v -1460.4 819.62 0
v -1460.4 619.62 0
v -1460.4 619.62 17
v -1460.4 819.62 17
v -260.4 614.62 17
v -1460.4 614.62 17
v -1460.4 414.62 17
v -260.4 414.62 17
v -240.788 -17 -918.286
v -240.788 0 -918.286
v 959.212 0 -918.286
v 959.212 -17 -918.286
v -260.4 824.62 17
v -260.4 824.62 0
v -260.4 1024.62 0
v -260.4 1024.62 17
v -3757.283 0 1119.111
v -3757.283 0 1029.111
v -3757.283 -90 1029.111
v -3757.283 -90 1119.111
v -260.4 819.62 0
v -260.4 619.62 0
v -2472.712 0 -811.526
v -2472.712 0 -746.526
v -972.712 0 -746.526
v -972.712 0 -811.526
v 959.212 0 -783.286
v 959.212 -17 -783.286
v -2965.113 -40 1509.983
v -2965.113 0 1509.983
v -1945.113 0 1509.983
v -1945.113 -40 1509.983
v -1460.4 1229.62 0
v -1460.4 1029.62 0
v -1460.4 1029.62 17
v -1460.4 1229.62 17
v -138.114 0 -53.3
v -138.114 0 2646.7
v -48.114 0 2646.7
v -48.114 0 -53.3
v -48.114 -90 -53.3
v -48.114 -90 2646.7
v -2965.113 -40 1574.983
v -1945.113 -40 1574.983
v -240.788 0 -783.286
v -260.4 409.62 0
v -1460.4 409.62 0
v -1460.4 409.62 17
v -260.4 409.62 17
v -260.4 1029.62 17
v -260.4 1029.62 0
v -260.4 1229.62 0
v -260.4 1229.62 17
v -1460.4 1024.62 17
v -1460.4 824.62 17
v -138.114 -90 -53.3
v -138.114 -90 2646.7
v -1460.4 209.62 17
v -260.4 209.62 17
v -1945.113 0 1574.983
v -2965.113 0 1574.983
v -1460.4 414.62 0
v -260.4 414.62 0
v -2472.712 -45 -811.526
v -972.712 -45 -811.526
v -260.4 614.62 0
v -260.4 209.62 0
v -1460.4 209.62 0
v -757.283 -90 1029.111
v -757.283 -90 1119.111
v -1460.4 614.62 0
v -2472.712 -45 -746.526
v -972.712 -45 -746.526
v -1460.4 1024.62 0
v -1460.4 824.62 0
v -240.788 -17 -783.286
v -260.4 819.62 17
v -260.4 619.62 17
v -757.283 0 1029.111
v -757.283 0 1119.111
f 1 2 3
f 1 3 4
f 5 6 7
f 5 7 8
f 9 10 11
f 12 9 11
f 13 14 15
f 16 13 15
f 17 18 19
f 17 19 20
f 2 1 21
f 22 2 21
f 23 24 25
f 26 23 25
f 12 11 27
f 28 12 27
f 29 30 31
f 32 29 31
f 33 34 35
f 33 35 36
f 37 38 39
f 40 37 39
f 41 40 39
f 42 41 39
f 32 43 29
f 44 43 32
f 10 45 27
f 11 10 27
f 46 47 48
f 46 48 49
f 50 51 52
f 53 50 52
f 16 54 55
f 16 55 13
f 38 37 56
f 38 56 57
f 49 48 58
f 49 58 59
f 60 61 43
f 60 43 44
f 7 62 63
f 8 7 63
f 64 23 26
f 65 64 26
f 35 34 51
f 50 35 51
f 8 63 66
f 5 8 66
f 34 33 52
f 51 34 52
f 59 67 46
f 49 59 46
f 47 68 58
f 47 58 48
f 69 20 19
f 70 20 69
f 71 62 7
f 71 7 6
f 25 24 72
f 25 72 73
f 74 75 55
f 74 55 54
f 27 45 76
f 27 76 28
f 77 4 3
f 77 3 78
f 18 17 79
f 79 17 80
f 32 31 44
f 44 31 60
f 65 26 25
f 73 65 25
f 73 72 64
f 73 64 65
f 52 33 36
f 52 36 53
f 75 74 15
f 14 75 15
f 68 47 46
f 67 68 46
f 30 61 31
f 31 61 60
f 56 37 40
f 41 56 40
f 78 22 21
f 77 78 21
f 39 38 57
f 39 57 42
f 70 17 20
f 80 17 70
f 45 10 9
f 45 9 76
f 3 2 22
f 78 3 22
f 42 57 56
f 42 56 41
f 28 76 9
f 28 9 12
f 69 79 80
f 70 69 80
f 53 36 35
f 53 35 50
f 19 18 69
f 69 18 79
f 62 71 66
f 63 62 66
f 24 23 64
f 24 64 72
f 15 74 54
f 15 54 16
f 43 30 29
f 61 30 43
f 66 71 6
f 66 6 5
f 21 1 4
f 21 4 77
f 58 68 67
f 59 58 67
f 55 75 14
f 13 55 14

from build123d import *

# Parameters (mm, degrees)
F0_W      = 90
F0_H      = 2700
F1_DEPTH  = 90
F2_W      = 3000
F2_H      = 90
F3_DEPTH  = 90
F4_W      = 1500
F4_H      = 65
F5_DEPTH  = 45
F6_W      = 1200
F6_H      = 135
F7_DEPTH  = 17
F8_W      = 1020
F8_H      = 65
F9_DEPTH  = 40
F10_W     = 1200
F10_H     = 200
F11_DEPTH = 17


with BuildPart() as f1:
    # F0 (on Front) → F1 (new body)
    with BuildSketch(Plane.XZ):
        with Locations((-93.11433, 1296.699694)):
            Rectangle(F0_W, F0_H)
    extrude(amount=F1_DEPTH)


with BuildPart() as f3:
    # F2 (on Front) → F3 (new body)
    with BuildSketch(Plane.XZ):
        with Locations((-2257.28339, 1074.110551)):
            Rectangle(F2_W, F2_H)
    extrude(amount=F3_DEPTH)


with BuildPart() as f5:
    # F4 (on Front) → F5 (new body)
    with BuildSketch(Plane.XZ):
        with Locations((-1722.711861, -779.025524)):
            Rectangle(F4_W, F4_H)
    extrude(amount=F5_DEPTH)


with BuildPart() as f7:
    # F6 (on Front) → F7 (new body)
    with BuildSketch(Plane.XZ):
        with Locations((359.212482, -850.785966)):
            Rectangle(F6_W, F6_H)
    extrude(amount=F7_DEPTH)


with BuildPart() as f9:
    # F8 (on Front) → F9 (new body)
    with BuildSketch(Plane.XZ):
        with Locations((-2455.112705, 1542.482824)):
            Rectangle(F8_W, F8_H)
    extrude(amount=F9_DEPTH)


with BuildPart() as f11:
    # F10 (on Top) → F11 (new body)
    with BuildSketch(Plane.XY):
        with Locations((-860.39955, 924.619805)):
            Rectangle(F10_W, F10_H)
        with Locations((-860.39955, 1129.619805)):
            Rectangle(F10_W, F10_H)
        with Locations((-860.39955, 719.619805)):
            Rectangle(F10_W, F10_H)
        with Locations((-860.39955, 514.619805)):
            Rectangle(F10_W, F10_H)
        with Locations((-860.39955, 309.619805)):
            Rectangle(F10_W, F10_H)
    extrude(amount=F11_DEPTH)


solid = Compound([f1.part, f3.part, f5.part, f7.part, f9.part, f11.part])
